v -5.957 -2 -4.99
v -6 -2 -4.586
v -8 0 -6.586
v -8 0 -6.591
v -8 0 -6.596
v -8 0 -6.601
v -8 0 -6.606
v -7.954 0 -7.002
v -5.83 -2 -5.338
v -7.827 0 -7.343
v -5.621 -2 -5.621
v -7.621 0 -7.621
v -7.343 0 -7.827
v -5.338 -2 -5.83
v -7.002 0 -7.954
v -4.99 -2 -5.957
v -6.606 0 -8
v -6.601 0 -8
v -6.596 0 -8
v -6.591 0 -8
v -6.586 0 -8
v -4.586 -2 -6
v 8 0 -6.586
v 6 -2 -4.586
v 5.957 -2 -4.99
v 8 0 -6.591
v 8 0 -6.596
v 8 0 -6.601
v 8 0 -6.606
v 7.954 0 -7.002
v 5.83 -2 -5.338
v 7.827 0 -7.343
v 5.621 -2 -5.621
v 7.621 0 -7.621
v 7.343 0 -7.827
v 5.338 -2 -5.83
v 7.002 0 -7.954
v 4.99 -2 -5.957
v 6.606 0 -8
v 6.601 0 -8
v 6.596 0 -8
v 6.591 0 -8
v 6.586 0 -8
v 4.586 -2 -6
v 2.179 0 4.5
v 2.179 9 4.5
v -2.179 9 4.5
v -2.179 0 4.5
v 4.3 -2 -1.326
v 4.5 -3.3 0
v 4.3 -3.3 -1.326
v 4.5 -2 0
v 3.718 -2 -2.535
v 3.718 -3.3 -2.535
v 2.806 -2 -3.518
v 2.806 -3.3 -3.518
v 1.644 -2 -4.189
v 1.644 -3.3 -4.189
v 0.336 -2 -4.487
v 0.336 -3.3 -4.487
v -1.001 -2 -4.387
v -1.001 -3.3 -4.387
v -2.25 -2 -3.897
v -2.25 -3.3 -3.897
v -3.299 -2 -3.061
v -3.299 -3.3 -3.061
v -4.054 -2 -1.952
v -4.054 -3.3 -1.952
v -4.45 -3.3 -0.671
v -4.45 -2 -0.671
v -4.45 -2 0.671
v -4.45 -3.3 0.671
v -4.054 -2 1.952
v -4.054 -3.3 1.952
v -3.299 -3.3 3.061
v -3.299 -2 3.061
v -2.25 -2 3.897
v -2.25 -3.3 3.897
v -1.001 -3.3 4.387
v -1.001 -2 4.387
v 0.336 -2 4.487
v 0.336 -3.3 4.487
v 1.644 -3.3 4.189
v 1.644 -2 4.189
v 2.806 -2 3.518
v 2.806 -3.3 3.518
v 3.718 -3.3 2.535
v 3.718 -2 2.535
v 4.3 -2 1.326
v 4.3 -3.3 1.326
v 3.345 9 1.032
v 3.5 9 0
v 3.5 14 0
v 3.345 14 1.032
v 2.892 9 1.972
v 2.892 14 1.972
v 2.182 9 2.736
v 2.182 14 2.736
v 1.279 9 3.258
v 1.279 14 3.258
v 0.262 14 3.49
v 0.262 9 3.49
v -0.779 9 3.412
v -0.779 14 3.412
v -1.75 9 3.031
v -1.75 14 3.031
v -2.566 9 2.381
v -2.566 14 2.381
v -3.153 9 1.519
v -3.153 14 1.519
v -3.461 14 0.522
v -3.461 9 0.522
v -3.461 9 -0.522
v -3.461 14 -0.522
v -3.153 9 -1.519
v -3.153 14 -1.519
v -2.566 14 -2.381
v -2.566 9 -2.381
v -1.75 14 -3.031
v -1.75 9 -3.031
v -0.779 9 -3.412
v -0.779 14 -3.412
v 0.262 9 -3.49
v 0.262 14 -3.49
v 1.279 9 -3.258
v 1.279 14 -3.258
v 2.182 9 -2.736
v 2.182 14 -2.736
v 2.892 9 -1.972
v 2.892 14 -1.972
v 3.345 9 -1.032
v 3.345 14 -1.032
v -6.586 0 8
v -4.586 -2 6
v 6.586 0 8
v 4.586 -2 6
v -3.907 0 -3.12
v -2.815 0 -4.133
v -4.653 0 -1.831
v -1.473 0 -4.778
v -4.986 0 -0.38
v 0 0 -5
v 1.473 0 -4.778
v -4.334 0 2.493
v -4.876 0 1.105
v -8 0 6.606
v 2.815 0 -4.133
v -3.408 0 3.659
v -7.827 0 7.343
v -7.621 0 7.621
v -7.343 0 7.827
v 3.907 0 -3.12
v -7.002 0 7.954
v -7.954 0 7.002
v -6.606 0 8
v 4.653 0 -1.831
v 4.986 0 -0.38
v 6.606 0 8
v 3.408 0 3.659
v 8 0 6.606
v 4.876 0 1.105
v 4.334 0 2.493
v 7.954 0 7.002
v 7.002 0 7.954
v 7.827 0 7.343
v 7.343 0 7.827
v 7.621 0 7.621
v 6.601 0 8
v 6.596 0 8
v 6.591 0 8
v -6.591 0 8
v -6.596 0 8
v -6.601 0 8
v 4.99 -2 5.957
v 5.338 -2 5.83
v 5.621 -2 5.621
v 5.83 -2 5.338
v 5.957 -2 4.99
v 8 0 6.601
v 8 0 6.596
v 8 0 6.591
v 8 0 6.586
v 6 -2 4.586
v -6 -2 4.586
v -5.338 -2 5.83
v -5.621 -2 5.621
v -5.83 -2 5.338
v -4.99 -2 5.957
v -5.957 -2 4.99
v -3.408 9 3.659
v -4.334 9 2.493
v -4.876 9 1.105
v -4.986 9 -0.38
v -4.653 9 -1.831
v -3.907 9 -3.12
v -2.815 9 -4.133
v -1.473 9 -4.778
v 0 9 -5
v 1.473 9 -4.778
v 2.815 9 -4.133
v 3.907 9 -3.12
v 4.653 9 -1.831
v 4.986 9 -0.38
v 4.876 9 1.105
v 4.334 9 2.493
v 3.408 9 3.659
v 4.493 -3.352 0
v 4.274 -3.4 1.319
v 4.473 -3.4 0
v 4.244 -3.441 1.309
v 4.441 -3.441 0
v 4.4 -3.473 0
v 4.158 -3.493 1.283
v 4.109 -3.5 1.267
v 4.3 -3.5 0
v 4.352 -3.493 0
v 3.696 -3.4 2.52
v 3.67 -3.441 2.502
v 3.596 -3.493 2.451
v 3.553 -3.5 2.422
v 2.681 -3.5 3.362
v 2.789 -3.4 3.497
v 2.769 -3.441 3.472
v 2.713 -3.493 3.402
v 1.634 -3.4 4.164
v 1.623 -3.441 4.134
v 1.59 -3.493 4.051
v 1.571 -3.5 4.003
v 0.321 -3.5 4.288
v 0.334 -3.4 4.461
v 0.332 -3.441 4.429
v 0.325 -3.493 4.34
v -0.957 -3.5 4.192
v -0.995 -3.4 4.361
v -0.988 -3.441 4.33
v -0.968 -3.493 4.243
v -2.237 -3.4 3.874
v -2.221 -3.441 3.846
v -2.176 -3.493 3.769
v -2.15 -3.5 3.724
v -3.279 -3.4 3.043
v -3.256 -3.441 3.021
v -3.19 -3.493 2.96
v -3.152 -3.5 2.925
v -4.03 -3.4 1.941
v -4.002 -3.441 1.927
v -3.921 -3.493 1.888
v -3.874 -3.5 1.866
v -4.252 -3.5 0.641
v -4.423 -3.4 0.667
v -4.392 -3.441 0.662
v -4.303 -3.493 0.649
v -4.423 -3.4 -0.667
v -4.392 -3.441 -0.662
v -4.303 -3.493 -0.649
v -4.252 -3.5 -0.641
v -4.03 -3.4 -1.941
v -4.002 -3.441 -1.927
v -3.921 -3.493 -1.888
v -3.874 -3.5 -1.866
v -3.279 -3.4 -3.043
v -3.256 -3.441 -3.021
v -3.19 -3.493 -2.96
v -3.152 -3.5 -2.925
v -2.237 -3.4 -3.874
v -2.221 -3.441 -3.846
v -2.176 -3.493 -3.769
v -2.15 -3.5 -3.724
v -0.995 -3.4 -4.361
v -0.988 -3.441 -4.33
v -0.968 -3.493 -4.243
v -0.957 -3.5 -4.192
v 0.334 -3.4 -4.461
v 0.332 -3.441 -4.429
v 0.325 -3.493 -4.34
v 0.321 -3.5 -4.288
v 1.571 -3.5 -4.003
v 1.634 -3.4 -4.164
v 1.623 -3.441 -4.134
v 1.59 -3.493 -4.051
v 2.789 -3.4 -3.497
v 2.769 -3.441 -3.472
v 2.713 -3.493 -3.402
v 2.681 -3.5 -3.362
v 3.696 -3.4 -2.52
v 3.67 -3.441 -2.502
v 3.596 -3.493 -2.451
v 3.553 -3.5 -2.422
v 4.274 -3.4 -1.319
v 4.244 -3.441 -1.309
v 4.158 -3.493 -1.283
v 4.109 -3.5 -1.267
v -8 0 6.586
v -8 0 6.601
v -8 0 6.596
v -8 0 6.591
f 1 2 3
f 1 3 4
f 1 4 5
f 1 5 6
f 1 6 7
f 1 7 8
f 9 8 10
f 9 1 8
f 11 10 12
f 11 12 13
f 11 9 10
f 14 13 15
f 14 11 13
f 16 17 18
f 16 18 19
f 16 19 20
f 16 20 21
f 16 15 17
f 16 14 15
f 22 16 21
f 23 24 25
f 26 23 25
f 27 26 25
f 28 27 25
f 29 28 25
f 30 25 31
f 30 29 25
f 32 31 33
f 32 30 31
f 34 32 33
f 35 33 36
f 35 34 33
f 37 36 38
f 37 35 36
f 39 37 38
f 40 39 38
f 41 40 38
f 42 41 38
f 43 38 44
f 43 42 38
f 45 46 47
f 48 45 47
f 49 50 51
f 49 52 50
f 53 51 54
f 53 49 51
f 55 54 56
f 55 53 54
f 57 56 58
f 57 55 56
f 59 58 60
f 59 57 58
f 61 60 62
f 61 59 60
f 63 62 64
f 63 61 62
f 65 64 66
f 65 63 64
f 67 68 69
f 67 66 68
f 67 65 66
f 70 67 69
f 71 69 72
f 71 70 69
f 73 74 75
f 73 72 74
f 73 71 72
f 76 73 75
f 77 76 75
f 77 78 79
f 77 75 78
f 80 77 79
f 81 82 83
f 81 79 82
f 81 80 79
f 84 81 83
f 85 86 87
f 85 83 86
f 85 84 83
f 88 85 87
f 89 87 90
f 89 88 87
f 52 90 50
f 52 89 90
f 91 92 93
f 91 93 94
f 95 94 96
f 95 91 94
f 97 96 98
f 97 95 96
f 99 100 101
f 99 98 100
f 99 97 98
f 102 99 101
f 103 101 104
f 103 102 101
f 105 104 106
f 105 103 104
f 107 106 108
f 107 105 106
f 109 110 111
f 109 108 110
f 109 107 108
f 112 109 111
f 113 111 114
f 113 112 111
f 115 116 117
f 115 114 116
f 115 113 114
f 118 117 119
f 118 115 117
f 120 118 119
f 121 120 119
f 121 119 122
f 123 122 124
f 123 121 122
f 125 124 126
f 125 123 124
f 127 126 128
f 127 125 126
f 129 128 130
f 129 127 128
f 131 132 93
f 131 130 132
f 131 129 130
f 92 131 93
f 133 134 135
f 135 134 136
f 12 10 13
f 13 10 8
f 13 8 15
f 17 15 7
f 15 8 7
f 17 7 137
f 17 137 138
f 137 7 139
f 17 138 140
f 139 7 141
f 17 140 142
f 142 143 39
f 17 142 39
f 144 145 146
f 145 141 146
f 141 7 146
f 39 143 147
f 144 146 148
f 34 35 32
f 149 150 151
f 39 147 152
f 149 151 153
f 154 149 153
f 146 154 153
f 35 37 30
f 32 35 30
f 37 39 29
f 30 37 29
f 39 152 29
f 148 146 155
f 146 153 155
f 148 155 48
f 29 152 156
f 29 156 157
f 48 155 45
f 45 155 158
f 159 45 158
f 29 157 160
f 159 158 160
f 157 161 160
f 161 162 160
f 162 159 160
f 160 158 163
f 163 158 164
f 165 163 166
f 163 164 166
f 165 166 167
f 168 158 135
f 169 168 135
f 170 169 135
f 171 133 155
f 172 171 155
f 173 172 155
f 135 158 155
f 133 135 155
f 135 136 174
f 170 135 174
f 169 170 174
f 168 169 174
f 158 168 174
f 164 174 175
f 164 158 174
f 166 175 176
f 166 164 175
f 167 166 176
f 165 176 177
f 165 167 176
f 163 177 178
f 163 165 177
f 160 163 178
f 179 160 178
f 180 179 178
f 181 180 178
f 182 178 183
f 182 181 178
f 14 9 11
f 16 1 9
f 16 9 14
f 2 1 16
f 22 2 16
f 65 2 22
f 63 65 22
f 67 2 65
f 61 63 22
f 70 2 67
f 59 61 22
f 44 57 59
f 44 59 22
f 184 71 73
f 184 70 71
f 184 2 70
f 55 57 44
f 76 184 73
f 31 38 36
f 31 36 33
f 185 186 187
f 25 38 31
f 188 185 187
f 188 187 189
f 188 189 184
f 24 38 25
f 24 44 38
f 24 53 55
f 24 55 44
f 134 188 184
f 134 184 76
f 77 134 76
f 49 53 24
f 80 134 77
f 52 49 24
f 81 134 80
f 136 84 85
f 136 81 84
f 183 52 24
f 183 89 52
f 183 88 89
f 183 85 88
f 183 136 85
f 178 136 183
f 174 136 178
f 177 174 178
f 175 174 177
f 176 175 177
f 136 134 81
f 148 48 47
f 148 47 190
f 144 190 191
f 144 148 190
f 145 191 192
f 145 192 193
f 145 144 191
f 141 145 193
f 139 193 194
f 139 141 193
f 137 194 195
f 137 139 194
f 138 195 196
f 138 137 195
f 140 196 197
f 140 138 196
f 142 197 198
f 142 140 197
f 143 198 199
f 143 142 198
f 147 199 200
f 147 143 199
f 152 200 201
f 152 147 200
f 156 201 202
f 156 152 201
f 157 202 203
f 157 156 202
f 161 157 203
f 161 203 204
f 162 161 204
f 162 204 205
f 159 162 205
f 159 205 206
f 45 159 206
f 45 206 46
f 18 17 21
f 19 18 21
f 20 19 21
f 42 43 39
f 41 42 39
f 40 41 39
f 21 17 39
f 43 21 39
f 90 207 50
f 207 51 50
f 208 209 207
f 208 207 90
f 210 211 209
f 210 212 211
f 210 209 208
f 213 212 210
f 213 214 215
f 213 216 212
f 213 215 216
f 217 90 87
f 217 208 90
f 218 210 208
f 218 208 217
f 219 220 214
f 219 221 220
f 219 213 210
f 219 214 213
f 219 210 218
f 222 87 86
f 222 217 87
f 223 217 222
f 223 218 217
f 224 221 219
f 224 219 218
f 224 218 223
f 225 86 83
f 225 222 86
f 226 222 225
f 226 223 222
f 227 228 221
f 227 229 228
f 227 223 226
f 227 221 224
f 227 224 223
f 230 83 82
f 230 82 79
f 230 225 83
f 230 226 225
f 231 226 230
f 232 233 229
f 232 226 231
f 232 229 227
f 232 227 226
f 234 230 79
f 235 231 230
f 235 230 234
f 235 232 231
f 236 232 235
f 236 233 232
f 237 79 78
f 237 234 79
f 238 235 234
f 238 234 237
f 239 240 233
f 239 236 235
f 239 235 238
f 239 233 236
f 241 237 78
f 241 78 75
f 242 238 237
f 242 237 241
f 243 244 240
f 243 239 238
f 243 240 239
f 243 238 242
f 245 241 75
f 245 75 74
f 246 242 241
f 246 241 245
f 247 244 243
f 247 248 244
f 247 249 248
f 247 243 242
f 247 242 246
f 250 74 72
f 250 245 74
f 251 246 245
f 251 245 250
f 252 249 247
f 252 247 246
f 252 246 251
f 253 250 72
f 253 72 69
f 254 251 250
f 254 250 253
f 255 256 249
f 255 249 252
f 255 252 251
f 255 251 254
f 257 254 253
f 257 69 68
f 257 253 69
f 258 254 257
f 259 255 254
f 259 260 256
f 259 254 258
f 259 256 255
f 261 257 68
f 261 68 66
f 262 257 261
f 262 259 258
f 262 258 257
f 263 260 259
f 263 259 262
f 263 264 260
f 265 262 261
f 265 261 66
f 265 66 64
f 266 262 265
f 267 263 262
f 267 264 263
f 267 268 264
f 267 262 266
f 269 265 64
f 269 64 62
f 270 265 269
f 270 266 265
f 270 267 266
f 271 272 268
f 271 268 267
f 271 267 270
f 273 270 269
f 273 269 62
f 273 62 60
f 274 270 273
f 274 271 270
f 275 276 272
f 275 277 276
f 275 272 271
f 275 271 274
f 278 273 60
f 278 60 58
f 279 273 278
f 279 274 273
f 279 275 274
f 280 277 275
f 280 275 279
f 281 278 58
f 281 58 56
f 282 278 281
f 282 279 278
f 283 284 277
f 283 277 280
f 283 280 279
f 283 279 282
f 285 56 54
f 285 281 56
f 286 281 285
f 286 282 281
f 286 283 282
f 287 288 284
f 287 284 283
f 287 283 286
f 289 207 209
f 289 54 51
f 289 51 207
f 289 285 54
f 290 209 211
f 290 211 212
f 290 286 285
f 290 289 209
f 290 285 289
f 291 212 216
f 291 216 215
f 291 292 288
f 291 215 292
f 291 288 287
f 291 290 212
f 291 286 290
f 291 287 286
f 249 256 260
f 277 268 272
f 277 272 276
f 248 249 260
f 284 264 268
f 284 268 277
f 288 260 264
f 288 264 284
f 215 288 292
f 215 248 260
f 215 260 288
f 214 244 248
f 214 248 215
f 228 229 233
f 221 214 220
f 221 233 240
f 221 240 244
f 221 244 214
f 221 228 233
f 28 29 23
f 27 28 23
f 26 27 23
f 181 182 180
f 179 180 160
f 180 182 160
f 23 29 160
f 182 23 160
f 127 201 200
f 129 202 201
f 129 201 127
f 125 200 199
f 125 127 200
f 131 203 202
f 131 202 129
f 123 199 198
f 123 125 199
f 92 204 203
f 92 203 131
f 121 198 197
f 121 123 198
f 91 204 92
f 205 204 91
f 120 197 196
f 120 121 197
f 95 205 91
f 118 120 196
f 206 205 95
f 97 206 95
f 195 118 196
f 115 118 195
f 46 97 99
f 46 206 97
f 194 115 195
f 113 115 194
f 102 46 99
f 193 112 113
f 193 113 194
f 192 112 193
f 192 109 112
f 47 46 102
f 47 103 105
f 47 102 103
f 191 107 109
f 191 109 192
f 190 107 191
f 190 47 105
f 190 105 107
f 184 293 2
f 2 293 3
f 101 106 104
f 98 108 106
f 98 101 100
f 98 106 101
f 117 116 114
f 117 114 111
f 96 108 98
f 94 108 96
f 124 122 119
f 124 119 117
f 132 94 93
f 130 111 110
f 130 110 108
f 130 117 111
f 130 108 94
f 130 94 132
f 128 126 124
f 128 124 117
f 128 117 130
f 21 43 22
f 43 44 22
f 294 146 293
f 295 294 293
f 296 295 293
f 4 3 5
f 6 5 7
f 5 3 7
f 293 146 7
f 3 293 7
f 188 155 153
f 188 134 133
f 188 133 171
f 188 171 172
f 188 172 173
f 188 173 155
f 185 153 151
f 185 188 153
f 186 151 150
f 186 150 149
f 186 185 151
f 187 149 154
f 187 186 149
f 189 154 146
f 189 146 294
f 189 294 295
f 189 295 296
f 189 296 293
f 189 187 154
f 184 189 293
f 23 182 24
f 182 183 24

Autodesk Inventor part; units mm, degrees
ref_plane "YZ Plane" through (0, 0, 0) normal (1, 0, 0) x (0, 1, 0)
ref_plane "XZ Plane" through (0, 0, 0) normal (0, 1, 0) x (-1, 0, 0)
ref_plane "XY Plane" through (0, 0, 0) normal (0, 0, 1) x (1, 0, 0)
sketch "Sketch1" plane through (0, 0, 0) normal (0, 1, 0) x (-1, 0, 0)
  circle A0 centre (0, 0) radius 5
  dimension "d0" = 10
extrude "Extrusion1" add sketch "Sketch1" along normal blind 9
sketch "Sketch2" plane through (0, 9, 0) normal (0, 1, 0) x (1, 0, 0)
  circle A0 centre (0, 0) radius 3.5
  dimension "d3" = 7
extrude "Extrusion2" add sketch "Sketch2" along normal blind 5
sketch "Sketch3" plane through (0, 0, 0) normal (0, -1, 0) x (1, 0, 0)
  line L0 (8, 8) -> (-8, 8)
  line L1 (-8, 8) -> (-8, -8)
  line L2 (-8, -8) -> (8, -8)
  line L3 (8, -8) -> (8, 8)
  point P0 (0, 0)
  dimension "d6" = 16
  dimension "d7" = 16
  dimension "d8" = 8
  dimension "d9" = 8
extrude "Extrusion3" add sketch "Sketch3" along normal blind 2
chamfer "Chamfer1" distance 2 angle 45 4 edges at (-8, -2, 0) (0, -2, 8) (8, -2, 0) (0, -2, -8)
fillet "Fillet1" radius 2 4 edges at (7, -1.0001, 7.0001) (-7.0001, -1.0001, 7) (-7, -1.0001, -7.0001) (7.0001, -1.0001, -7)
sketch "Sketch4" plane through (0, -2, 0) normal (0, -1, 0) x (1, 0, 0)
  circle A0 centre (0, 0) radius 4.5
  dimension "d16" = 9
extrude "Extrusion4" add sketch "Sketch4" along normal blind 1.5
fillet "Fillet2" radius 0.2 1 edges at (-4.5, -3.5, 0)
sketch "Sketch5" plane through (0, 9, 0) normal (0, 1, 0) x (1, 0, 0)
  circle A0 centre (0, 0) radius 5 projected
  line L0 (2.1794, -4.5) -> (-2.1794, -4.5)
  arc A1 (-2.1794, -4.5) -> (2.1794, -4.5) centre (0, 0) ccw
  dimension "d20" = 4.5
extrude "Extrusion5" cut sketch "Sketch5" against normal blind 9 contours L0 A0 picked at (-0.3727, -4.6245)
properties part number "StartBtn"
